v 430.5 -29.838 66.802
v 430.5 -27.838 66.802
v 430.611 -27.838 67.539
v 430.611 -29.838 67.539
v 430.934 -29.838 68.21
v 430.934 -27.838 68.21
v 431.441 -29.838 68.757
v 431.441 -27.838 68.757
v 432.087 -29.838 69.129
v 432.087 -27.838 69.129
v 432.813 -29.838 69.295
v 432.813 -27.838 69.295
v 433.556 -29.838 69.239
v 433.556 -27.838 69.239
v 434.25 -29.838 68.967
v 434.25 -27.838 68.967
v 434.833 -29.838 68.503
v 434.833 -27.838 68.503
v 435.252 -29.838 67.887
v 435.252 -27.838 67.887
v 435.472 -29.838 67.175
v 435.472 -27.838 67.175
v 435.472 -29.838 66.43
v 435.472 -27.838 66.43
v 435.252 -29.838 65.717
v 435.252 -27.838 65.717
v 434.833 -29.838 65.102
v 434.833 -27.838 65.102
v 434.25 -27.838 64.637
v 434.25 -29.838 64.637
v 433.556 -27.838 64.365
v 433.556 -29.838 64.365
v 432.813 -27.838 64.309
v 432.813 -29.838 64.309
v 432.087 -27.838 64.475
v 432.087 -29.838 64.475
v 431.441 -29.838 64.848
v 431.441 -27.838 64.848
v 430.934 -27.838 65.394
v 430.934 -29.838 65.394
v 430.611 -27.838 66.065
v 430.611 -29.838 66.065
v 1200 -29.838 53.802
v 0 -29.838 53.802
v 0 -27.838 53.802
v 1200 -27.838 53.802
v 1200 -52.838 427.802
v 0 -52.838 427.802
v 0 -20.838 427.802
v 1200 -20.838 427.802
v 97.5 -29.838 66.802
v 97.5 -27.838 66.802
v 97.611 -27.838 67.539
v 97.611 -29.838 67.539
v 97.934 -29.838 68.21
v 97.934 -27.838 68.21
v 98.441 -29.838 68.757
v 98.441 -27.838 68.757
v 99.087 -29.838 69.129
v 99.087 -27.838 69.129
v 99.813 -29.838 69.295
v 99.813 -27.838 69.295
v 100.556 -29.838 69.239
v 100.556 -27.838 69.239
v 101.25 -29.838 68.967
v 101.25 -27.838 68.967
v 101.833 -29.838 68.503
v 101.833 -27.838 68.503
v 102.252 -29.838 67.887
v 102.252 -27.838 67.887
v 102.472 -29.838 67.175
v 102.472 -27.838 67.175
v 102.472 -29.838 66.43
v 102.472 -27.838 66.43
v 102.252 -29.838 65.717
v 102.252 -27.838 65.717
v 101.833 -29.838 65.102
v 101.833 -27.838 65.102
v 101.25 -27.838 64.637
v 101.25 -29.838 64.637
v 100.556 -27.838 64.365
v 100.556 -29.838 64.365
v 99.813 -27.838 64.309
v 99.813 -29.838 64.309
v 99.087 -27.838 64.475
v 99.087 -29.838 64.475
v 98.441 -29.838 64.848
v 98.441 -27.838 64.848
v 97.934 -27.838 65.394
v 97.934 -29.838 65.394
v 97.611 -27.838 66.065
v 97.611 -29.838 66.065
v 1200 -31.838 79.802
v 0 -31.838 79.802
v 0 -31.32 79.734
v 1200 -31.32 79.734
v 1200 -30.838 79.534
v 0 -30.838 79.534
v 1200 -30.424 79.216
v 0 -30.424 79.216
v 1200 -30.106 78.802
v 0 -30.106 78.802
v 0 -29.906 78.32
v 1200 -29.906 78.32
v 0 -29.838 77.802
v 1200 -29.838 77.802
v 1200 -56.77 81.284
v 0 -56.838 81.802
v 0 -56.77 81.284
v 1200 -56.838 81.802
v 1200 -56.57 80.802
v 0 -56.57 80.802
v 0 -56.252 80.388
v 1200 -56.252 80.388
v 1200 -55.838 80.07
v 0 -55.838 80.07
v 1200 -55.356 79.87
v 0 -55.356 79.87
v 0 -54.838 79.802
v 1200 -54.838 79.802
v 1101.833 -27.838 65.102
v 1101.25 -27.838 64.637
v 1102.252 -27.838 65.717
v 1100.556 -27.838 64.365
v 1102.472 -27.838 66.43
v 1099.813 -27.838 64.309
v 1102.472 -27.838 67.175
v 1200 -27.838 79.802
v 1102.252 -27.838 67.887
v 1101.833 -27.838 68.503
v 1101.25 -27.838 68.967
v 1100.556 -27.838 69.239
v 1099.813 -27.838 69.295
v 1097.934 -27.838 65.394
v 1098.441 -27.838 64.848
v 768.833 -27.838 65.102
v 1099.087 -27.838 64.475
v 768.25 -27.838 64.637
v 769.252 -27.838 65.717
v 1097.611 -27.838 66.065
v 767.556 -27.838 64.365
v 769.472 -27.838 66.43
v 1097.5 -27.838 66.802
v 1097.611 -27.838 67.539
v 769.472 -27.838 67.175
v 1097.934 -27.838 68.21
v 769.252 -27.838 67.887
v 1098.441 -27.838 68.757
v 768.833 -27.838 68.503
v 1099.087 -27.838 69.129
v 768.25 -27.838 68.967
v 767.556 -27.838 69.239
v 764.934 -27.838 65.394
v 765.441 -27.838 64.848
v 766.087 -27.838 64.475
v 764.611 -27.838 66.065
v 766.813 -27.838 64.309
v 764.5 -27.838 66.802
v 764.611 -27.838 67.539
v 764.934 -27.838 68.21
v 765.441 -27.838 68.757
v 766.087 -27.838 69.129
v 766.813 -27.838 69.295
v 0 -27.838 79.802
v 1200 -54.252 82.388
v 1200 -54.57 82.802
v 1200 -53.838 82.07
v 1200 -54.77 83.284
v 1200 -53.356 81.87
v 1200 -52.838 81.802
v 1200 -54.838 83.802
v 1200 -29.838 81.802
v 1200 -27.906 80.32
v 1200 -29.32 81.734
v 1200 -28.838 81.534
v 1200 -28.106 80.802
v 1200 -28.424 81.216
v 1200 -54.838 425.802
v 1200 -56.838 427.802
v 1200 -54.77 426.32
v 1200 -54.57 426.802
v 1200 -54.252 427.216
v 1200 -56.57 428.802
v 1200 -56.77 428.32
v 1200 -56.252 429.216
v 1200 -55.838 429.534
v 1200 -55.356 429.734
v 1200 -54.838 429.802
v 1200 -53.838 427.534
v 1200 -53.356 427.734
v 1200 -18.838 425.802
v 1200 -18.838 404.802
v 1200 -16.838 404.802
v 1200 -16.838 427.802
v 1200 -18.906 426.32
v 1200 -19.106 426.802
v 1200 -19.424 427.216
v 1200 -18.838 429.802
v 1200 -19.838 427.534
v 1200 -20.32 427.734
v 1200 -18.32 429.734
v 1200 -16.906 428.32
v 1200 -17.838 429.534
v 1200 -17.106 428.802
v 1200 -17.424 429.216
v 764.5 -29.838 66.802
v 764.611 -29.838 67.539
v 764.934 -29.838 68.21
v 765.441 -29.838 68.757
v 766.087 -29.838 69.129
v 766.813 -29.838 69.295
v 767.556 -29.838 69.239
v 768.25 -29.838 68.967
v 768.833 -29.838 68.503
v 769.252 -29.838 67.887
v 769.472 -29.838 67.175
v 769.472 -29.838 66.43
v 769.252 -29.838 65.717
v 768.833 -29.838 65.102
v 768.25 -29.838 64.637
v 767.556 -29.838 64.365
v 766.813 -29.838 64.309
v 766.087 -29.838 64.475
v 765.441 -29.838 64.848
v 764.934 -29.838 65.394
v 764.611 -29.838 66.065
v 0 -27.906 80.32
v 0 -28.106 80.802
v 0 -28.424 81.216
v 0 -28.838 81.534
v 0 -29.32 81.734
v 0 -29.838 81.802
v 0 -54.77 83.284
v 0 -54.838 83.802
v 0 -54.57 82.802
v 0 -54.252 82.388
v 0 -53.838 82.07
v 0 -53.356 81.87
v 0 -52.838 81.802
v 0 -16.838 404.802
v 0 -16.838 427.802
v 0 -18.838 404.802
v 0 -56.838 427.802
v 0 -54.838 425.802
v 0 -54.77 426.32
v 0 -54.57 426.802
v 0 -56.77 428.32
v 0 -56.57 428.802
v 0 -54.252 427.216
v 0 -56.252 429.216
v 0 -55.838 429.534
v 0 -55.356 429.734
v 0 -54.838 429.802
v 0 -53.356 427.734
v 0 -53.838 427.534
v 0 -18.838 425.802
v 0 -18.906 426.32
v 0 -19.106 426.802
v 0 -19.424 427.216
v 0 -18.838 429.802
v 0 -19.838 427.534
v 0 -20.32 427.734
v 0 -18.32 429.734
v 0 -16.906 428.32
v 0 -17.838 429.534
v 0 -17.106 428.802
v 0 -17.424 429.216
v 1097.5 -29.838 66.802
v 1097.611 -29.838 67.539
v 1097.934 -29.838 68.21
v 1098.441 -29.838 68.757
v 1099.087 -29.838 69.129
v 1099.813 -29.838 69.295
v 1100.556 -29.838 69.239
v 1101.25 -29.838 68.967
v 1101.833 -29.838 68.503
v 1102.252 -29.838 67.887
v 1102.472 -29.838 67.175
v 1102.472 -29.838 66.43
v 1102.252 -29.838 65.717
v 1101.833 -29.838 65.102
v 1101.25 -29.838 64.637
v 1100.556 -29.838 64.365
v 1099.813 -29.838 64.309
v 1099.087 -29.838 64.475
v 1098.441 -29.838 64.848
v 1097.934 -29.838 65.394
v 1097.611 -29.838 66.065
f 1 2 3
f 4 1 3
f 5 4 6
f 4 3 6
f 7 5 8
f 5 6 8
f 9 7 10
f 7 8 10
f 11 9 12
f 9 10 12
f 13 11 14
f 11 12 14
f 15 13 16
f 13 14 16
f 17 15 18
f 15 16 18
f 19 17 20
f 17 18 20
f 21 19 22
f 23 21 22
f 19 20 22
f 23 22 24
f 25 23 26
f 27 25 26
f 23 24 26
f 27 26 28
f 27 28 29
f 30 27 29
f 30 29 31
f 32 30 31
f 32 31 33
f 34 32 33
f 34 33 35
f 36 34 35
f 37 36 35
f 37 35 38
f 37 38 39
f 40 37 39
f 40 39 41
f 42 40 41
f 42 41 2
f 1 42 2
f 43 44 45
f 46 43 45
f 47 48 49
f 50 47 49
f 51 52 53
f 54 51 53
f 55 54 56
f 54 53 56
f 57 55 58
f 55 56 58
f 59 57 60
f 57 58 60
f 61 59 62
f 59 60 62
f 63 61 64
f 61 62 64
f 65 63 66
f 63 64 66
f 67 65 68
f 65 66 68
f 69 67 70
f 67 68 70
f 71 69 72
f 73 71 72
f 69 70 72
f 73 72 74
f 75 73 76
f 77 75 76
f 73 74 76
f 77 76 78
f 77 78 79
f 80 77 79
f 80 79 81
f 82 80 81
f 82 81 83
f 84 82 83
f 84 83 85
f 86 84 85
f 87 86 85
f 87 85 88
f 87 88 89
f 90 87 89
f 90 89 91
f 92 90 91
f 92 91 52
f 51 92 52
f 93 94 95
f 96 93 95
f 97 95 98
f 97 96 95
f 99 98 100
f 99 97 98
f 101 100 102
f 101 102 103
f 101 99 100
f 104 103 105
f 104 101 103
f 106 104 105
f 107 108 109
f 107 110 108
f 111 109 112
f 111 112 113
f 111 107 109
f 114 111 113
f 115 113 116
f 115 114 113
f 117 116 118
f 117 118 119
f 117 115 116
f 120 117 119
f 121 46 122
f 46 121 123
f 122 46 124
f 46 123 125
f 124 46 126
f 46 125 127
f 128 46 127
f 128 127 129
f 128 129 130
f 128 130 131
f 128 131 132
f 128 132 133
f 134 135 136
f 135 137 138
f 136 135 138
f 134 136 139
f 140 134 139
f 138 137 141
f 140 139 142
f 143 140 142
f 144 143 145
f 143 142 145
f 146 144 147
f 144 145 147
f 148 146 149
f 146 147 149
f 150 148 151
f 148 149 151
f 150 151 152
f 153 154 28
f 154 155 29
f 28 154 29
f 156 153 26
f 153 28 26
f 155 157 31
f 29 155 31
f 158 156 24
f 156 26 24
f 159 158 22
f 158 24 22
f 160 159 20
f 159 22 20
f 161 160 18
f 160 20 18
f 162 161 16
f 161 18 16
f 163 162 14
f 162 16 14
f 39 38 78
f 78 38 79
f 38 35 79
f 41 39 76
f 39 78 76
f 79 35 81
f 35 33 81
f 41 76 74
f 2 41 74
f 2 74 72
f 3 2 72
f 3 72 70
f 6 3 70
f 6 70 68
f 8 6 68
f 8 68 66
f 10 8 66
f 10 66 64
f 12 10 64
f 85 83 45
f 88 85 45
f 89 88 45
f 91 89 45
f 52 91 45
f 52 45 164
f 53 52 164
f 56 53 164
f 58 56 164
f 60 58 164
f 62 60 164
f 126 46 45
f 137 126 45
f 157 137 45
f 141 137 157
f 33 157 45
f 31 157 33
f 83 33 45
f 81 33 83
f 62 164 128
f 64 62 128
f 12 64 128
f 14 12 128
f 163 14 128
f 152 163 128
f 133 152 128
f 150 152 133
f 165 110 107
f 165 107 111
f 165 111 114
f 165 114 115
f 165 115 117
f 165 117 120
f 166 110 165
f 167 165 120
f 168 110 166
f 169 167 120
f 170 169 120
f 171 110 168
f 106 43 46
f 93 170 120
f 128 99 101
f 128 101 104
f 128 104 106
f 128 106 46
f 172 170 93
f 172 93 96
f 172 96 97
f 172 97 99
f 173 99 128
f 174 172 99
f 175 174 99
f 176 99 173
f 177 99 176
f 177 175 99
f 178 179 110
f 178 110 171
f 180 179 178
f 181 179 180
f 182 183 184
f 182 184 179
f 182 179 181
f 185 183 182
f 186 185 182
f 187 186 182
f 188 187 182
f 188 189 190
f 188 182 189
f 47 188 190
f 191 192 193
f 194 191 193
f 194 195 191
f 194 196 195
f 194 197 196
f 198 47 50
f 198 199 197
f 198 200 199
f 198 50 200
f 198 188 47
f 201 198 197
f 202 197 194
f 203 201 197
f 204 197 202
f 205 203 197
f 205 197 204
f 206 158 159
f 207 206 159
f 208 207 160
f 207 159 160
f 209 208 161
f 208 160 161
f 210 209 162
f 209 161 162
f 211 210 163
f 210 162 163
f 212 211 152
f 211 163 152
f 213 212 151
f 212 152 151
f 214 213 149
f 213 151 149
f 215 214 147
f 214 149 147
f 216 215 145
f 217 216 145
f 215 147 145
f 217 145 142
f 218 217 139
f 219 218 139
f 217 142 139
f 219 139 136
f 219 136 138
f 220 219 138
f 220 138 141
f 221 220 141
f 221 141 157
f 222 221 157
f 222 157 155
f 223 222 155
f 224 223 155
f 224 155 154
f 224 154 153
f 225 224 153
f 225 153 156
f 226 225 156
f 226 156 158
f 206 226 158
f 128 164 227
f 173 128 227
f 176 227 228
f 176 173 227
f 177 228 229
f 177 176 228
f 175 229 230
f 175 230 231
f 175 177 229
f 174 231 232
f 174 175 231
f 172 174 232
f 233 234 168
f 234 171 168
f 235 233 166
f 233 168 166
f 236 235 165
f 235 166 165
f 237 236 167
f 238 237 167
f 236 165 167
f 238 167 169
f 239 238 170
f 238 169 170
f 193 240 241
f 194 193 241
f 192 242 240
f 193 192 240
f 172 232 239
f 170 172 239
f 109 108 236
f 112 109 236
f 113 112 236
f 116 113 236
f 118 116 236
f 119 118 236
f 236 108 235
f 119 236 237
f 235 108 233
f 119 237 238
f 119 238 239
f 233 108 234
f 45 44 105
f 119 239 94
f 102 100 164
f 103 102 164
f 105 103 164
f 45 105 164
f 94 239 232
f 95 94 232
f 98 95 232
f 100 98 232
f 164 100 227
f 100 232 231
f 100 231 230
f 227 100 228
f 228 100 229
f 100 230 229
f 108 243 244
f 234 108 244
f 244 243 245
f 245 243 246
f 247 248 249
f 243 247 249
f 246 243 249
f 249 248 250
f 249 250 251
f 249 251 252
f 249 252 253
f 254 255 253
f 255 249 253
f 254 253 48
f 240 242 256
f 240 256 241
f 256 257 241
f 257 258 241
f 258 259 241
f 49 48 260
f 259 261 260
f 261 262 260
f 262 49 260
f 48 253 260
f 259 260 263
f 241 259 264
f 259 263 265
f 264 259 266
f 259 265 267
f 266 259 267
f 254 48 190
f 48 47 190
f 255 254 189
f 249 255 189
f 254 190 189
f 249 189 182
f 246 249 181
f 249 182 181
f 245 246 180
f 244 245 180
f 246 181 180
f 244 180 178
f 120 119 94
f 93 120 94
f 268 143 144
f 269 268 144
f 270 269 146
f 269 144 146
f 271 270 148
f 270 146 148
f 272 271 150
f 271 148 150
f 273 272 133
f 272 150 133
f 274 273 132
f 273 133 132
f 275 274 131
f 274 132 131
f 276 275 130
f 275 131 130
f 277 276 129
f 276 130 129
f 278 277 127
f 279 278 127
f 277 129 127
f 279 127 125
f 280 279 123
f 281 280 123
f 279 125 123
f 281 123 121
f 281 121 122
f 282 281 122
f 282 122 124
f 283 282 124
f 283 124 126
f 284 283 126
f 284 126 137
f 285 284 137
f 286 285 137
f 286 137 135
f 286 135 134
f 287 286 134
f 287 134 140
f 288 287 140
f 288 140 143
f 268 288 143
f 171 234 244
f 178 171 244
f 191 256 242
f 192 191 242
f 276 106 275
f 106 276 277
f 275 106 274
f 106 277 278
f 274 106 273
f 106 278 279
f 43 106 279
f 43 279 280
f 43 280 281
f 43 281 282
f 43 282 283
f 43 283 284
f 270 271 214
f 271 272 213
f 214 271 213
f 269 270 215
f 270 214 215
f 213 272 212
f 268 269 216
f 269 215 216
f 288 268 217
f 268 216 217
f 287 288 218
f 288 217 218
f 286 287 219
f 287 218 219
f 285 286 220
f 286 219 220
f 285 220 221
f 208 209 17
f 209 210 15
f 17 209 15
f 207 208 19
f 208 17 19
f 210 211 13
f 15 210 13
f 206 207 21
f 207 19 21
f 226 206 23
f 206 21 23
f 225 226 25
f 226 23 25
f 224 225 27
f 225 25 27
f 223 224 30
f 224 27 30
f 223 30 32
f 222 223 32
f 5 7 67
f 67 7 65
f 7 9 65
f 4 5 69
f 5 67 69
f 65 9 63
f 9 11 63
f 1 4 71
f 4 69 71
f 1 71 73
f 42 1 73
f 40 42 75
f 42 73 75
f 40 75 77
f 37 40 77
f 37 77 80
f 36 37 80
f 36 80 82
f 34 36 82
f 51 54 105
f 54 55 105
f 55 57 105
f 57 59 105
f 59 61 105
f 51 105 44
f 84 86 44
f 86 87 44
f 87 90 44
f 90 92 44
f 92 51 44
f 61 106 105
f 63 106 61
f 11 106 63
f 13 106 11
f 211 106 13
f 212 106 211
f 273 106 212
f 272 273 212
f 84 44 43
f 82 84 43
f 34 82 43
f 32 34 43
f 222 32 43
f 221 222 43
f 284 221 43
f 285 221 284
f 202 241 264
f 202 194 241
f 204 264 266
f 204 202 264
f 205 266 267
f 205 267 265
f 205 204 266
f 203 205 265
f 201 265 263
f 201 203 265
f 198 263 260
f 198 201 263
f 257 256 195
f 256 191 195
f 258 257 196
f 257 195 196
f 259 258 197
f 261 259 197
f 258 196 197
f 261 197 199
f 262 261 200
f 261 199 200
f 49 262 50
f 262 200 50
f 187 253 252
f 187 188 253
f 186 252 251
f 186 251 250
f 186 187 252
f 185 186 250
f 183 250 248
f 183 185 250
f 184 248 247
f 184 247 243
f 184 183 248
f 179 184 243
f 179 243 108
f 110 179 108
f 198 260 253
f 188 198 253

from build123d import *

# Parameters (mm, degrees)
F1_DEPTH = 1200
F3_D     = 5
F4_R     = 2


# Not quite as in the source:
# - a feature names something its author has since deleted; it is built from what else it names


with BuildPart() as f1:
    # F0 (on Right) → F1 (new body)
    with BuildSketch(Plane.YZ):
        Polygon((-18.8378913403, 427.8021101952), (-18.8378913403, 404.8021101952), (-16.8378913403, 404.8021101952), (-16.8378913403, 429.8021101952), (-56.8378913403, 429.8021101952), (-56.8378913403, 79.8021101952), (-29.8378913403, 79.8021101952), (-29.8378913403, 53.8021101952), (-27.8378913403, 53.8021101952), (-27.8378913403, 81.8021101952), (-54.8378913403, 81.8021101952), (-54.8378913403, 427.8021101952), align=None)
    extrude(amount=F1_DEPTH)

    # F3 (through all)
    with Locations(Plane.XZ.offset(29.8378913403)):
        with Locations((433, 66.8021101952), (767, 66.8021101952), (1100, 66.8021101952), (100, 66.8021101952)):
            Hole(F3_D / 2)

    # F4
    f4_edges = [f1.edges().sort_by_distance(p)[0] for p in [
        (600, -56.837891, 429.80211),
        (600, -16.837891, 429.80211),
        (600, -56.837891, 79.80211),
        (600, -27.837891, 81.80211),
        (600, -54.837891, 81.80211),
        (600, -29.837891, 79.80211),
        (600, -18.837891, 427.80211),
        (600, -54.837891, 427.80211),
    ]]
    fillet(f4_edges, radius=F4_R)


solid = f1.part
